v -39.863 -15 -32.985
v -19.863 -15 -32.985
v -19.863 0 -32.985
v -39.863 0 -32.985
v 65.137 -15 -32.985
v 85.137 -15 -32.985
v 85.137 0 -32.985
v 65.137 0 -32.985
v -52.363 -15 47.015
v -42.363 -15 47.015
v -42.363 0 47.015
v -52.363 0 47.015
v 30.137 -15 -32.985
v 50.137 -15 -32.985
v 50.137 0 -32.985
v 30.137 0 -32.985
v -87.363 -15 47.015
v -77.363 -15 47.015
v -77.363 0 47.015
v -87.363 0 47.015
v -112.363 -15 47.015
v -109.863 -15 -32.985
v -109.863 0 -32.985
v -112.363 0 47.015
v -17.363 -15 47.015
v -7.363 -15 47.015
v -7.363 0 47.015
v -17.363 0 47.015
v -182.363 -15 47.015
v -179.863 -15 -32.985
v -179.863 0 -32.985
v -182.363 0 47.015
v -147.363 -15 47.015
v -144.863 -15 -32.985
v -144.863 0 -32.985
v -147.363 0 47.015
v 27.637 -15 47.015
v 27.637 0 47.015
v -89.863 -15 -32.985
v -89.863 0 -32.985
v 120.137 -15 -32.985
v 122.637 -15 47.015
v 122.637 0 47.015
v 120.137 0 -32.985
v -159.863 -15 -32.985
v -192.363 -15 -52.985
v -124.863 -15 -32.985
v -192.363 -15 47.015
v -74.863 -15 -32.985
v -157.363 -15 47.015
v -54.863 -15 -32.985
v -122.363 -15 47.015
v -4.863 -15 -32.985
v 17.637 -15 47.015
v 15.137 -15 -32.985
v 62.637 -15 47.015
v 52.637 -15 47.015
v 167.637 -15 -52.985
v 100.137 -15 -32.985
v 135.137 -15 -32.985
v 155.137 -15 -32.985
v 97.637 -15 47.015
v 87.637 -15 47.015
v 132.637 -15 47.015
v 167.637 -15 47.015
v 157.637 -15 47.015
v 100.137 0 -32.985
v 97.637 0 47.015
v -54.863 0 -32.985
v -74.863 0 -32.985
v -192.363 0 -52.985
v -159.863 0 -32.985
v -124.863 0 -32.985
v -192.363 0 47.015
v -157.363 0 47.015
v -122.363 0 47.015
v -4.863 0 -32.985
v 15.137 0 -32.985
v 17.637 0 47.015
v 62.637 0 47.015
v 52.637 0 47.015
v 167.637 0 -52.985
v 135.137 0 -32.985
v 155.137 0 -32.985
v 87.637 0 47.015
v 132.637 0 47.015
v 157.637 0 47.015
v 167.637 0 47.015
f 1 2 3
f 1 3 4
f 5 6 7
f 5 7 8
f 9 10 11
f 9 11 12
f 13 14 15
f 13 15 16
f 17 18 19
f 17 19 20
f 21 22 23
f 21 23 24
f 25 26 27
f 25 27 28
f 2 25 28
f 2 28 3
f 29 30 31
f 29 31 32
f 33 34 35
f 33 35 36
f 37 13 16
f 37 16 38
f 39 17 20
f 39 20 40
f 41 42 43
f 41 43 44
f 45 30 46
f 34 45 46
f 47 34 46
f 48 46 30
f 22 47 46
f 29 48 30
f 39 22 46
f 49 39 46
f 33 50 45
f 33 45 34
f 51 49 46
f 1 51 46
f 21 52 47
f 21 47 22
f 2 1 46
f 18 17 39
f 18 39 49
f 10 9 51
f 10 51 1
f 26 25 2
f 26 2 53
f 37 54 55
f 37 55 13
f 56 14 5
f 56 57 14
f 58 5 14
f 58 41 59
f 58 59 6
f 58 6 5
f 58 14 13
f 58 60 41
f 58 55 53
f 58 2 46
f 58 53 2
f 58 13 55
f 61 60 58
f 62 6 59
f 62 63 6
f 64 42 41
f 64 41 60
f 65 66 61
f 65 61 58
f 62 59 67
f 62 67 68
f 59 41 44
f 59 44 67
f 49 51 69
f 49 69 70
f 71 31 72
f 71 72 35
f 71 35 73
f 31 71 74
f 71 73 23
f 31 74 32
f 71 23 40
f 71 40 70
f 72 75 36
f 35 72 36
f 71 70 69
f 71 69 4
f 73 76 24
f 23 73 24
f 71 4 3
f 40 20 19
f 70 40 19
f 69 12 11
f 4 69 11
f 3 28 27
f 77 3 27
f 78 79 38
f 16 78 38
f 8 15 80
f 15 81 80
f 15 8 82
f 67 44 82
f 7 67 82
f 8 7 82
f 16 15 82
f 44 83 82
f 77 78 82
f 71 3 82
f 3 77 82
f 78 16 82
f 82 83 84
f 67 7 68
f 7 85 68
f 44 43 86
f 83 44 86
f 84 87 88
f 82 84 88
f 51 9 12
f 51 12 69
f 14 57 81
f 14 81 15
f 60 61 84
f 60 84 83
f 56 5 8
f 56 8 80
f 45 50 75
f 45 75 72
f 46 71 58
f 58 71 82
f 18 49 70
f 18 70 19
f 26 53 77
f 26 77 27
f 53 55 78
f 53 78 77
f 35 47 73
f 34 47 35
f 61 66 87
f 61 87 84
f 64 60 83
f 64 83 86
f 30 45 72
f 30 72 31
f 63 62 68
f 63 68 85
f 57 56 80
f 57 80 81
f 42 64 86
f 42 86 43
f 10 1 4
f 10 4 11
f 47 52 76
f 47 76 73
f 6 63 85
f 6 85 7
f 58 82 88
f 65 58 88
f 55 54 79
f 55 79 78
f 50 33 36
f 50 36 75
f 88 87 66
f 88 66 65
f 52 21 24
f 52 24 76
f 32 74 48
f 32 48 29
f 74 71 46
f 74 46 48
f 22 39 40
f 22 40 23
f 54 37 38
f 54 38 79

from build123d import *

# Parameters (mm, degrees)
F0_W     = 360
F0_H     = 100
F1_DEPTH = 15
F3_DEPTH = 15


with BuildPart() as f1:
    # F0 (on Front) → F1 (new body)
    with BuildSketch(Plane.XZ):
        with Locations((-12.363208, -2.984696)):
            Rectangle(F0_W, F0_H)
    extrude(amount=F1_DEPTH)

    # F2 (on face) → F3 (intersect, through all)
    with BuildSketch(Plane.XZ.offset(15)):
        Polygon((-182.363208, 47.015304), (-192.363208, 47.015304), (-192.363208, -52.984696), (167.636792, -52.984696), (167.636792, 47.015304), (157.636792, 47.015304), (155.136792, -32.984696), (135.136792, -32.984696), (132.636792, 47.015304), (122.636792, 47.015304), (120.136792, -32.984696), (100.136792, -32.984696), (97.636792, 47.015304), (87.636792, 47.015304), (85.136792, -32.984696), (65.136792, -32.984696), (62.636792, 47.015304), (52.636792, 47.015304), (50.136792, -32.984696), (30.136792, -32.984696), (27.636792, 47.015304), (17.636792, 47.015304), (15.136792, -32.984696), (-4.863208, -32.984696), (-7.363208, 47.015304), (-17.363208, 47.015304), (-19.863208, -32.984696), (-39.863208, -32.984696), (-42.363208, 47.015304), (-52.363208, 47.015304), (-54.863208, -32.984696), (-74.863208, -32.984696), (-77.363208, 47.015304), (-87.363208, 47.015304), (-89.863208, -32.984696), (-109.863208, -32.984696), (-112.363208, 47.015304), (-122.363208, 47.015304), (-124.863208, -32.984696), (-144.863208, -32.984696), (-147.363208, 47.015304), (-157.363208, 47.015304), (-159.863208, -32.984696), (-179.863208, -32.984696), align=None)
    extrude(amount=-F3_DEPTH, mode=Mode.INTERSECT)


solid = f1.part
